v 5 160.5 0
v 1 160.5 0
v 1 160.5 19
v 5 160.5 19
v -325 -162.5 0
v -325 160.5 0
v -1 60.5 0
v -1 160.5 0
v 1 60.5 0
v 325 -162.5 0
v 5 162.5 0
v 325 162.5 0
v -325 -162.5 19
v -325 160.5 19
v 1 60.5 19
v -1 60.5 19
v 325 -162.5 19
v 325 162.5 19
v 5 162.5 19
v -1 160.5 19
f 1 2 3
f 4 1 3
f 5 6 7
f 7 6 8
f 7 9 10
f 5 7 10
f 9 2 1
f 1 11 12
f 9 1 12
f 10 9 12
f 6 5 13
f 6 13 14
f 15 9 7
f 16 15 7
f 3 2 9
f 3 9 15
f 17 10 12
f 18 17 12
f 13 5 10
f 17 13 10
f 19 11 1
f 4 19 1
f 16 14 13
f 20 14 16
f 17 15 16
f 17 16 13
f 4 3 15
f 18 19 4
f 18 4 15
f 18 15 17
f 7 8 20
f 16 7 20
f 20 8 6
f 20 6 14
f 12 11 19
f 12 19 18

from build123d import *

# Parameters (mm, degrees)
F0_W     = 650
F0_H     = 325
F1_DEPTH = 19
F2_W     = 2
F2_H     = 19
F3_DEPTH = 330
F4_W     = 2
F4_H     = 19
F5_DEPTH = 100


with BuildPart() as f1:
    # F0 (on Top) → F1 (new body)
    with BuildSketch(Plane.XY):
        Rectangle(F0_W, F0_H)
    extrude(amount=F1_DEPTH)

    # F2 (on face) → F3 (cut)
    with BuildSketch(Plane(origin=(-325, 0, 0), x_dir=(0, -1, 0), z_dir=(-1, 0, 0))):
        with Locations((-161.5, 9.5)):
            Rectangle(F2_W, F2_H)
    extrude(amount=-F3_DEPTH, mode=Mode.SUBTRACT)

    # F4 (on face) → F5 (cut)
    with BuildSketch(Plane(origin=(0, 160.5, 0), x_dir=(-1, 0, 0), z_dir=(0, 1, 0))):
        with Locations((0, 9.5)):
            Rectangle(F4_W, F4_H)
    extrude(amount=-F5_DEPTH, mode=Mode.SUBTRACT)


solid = f1.part
